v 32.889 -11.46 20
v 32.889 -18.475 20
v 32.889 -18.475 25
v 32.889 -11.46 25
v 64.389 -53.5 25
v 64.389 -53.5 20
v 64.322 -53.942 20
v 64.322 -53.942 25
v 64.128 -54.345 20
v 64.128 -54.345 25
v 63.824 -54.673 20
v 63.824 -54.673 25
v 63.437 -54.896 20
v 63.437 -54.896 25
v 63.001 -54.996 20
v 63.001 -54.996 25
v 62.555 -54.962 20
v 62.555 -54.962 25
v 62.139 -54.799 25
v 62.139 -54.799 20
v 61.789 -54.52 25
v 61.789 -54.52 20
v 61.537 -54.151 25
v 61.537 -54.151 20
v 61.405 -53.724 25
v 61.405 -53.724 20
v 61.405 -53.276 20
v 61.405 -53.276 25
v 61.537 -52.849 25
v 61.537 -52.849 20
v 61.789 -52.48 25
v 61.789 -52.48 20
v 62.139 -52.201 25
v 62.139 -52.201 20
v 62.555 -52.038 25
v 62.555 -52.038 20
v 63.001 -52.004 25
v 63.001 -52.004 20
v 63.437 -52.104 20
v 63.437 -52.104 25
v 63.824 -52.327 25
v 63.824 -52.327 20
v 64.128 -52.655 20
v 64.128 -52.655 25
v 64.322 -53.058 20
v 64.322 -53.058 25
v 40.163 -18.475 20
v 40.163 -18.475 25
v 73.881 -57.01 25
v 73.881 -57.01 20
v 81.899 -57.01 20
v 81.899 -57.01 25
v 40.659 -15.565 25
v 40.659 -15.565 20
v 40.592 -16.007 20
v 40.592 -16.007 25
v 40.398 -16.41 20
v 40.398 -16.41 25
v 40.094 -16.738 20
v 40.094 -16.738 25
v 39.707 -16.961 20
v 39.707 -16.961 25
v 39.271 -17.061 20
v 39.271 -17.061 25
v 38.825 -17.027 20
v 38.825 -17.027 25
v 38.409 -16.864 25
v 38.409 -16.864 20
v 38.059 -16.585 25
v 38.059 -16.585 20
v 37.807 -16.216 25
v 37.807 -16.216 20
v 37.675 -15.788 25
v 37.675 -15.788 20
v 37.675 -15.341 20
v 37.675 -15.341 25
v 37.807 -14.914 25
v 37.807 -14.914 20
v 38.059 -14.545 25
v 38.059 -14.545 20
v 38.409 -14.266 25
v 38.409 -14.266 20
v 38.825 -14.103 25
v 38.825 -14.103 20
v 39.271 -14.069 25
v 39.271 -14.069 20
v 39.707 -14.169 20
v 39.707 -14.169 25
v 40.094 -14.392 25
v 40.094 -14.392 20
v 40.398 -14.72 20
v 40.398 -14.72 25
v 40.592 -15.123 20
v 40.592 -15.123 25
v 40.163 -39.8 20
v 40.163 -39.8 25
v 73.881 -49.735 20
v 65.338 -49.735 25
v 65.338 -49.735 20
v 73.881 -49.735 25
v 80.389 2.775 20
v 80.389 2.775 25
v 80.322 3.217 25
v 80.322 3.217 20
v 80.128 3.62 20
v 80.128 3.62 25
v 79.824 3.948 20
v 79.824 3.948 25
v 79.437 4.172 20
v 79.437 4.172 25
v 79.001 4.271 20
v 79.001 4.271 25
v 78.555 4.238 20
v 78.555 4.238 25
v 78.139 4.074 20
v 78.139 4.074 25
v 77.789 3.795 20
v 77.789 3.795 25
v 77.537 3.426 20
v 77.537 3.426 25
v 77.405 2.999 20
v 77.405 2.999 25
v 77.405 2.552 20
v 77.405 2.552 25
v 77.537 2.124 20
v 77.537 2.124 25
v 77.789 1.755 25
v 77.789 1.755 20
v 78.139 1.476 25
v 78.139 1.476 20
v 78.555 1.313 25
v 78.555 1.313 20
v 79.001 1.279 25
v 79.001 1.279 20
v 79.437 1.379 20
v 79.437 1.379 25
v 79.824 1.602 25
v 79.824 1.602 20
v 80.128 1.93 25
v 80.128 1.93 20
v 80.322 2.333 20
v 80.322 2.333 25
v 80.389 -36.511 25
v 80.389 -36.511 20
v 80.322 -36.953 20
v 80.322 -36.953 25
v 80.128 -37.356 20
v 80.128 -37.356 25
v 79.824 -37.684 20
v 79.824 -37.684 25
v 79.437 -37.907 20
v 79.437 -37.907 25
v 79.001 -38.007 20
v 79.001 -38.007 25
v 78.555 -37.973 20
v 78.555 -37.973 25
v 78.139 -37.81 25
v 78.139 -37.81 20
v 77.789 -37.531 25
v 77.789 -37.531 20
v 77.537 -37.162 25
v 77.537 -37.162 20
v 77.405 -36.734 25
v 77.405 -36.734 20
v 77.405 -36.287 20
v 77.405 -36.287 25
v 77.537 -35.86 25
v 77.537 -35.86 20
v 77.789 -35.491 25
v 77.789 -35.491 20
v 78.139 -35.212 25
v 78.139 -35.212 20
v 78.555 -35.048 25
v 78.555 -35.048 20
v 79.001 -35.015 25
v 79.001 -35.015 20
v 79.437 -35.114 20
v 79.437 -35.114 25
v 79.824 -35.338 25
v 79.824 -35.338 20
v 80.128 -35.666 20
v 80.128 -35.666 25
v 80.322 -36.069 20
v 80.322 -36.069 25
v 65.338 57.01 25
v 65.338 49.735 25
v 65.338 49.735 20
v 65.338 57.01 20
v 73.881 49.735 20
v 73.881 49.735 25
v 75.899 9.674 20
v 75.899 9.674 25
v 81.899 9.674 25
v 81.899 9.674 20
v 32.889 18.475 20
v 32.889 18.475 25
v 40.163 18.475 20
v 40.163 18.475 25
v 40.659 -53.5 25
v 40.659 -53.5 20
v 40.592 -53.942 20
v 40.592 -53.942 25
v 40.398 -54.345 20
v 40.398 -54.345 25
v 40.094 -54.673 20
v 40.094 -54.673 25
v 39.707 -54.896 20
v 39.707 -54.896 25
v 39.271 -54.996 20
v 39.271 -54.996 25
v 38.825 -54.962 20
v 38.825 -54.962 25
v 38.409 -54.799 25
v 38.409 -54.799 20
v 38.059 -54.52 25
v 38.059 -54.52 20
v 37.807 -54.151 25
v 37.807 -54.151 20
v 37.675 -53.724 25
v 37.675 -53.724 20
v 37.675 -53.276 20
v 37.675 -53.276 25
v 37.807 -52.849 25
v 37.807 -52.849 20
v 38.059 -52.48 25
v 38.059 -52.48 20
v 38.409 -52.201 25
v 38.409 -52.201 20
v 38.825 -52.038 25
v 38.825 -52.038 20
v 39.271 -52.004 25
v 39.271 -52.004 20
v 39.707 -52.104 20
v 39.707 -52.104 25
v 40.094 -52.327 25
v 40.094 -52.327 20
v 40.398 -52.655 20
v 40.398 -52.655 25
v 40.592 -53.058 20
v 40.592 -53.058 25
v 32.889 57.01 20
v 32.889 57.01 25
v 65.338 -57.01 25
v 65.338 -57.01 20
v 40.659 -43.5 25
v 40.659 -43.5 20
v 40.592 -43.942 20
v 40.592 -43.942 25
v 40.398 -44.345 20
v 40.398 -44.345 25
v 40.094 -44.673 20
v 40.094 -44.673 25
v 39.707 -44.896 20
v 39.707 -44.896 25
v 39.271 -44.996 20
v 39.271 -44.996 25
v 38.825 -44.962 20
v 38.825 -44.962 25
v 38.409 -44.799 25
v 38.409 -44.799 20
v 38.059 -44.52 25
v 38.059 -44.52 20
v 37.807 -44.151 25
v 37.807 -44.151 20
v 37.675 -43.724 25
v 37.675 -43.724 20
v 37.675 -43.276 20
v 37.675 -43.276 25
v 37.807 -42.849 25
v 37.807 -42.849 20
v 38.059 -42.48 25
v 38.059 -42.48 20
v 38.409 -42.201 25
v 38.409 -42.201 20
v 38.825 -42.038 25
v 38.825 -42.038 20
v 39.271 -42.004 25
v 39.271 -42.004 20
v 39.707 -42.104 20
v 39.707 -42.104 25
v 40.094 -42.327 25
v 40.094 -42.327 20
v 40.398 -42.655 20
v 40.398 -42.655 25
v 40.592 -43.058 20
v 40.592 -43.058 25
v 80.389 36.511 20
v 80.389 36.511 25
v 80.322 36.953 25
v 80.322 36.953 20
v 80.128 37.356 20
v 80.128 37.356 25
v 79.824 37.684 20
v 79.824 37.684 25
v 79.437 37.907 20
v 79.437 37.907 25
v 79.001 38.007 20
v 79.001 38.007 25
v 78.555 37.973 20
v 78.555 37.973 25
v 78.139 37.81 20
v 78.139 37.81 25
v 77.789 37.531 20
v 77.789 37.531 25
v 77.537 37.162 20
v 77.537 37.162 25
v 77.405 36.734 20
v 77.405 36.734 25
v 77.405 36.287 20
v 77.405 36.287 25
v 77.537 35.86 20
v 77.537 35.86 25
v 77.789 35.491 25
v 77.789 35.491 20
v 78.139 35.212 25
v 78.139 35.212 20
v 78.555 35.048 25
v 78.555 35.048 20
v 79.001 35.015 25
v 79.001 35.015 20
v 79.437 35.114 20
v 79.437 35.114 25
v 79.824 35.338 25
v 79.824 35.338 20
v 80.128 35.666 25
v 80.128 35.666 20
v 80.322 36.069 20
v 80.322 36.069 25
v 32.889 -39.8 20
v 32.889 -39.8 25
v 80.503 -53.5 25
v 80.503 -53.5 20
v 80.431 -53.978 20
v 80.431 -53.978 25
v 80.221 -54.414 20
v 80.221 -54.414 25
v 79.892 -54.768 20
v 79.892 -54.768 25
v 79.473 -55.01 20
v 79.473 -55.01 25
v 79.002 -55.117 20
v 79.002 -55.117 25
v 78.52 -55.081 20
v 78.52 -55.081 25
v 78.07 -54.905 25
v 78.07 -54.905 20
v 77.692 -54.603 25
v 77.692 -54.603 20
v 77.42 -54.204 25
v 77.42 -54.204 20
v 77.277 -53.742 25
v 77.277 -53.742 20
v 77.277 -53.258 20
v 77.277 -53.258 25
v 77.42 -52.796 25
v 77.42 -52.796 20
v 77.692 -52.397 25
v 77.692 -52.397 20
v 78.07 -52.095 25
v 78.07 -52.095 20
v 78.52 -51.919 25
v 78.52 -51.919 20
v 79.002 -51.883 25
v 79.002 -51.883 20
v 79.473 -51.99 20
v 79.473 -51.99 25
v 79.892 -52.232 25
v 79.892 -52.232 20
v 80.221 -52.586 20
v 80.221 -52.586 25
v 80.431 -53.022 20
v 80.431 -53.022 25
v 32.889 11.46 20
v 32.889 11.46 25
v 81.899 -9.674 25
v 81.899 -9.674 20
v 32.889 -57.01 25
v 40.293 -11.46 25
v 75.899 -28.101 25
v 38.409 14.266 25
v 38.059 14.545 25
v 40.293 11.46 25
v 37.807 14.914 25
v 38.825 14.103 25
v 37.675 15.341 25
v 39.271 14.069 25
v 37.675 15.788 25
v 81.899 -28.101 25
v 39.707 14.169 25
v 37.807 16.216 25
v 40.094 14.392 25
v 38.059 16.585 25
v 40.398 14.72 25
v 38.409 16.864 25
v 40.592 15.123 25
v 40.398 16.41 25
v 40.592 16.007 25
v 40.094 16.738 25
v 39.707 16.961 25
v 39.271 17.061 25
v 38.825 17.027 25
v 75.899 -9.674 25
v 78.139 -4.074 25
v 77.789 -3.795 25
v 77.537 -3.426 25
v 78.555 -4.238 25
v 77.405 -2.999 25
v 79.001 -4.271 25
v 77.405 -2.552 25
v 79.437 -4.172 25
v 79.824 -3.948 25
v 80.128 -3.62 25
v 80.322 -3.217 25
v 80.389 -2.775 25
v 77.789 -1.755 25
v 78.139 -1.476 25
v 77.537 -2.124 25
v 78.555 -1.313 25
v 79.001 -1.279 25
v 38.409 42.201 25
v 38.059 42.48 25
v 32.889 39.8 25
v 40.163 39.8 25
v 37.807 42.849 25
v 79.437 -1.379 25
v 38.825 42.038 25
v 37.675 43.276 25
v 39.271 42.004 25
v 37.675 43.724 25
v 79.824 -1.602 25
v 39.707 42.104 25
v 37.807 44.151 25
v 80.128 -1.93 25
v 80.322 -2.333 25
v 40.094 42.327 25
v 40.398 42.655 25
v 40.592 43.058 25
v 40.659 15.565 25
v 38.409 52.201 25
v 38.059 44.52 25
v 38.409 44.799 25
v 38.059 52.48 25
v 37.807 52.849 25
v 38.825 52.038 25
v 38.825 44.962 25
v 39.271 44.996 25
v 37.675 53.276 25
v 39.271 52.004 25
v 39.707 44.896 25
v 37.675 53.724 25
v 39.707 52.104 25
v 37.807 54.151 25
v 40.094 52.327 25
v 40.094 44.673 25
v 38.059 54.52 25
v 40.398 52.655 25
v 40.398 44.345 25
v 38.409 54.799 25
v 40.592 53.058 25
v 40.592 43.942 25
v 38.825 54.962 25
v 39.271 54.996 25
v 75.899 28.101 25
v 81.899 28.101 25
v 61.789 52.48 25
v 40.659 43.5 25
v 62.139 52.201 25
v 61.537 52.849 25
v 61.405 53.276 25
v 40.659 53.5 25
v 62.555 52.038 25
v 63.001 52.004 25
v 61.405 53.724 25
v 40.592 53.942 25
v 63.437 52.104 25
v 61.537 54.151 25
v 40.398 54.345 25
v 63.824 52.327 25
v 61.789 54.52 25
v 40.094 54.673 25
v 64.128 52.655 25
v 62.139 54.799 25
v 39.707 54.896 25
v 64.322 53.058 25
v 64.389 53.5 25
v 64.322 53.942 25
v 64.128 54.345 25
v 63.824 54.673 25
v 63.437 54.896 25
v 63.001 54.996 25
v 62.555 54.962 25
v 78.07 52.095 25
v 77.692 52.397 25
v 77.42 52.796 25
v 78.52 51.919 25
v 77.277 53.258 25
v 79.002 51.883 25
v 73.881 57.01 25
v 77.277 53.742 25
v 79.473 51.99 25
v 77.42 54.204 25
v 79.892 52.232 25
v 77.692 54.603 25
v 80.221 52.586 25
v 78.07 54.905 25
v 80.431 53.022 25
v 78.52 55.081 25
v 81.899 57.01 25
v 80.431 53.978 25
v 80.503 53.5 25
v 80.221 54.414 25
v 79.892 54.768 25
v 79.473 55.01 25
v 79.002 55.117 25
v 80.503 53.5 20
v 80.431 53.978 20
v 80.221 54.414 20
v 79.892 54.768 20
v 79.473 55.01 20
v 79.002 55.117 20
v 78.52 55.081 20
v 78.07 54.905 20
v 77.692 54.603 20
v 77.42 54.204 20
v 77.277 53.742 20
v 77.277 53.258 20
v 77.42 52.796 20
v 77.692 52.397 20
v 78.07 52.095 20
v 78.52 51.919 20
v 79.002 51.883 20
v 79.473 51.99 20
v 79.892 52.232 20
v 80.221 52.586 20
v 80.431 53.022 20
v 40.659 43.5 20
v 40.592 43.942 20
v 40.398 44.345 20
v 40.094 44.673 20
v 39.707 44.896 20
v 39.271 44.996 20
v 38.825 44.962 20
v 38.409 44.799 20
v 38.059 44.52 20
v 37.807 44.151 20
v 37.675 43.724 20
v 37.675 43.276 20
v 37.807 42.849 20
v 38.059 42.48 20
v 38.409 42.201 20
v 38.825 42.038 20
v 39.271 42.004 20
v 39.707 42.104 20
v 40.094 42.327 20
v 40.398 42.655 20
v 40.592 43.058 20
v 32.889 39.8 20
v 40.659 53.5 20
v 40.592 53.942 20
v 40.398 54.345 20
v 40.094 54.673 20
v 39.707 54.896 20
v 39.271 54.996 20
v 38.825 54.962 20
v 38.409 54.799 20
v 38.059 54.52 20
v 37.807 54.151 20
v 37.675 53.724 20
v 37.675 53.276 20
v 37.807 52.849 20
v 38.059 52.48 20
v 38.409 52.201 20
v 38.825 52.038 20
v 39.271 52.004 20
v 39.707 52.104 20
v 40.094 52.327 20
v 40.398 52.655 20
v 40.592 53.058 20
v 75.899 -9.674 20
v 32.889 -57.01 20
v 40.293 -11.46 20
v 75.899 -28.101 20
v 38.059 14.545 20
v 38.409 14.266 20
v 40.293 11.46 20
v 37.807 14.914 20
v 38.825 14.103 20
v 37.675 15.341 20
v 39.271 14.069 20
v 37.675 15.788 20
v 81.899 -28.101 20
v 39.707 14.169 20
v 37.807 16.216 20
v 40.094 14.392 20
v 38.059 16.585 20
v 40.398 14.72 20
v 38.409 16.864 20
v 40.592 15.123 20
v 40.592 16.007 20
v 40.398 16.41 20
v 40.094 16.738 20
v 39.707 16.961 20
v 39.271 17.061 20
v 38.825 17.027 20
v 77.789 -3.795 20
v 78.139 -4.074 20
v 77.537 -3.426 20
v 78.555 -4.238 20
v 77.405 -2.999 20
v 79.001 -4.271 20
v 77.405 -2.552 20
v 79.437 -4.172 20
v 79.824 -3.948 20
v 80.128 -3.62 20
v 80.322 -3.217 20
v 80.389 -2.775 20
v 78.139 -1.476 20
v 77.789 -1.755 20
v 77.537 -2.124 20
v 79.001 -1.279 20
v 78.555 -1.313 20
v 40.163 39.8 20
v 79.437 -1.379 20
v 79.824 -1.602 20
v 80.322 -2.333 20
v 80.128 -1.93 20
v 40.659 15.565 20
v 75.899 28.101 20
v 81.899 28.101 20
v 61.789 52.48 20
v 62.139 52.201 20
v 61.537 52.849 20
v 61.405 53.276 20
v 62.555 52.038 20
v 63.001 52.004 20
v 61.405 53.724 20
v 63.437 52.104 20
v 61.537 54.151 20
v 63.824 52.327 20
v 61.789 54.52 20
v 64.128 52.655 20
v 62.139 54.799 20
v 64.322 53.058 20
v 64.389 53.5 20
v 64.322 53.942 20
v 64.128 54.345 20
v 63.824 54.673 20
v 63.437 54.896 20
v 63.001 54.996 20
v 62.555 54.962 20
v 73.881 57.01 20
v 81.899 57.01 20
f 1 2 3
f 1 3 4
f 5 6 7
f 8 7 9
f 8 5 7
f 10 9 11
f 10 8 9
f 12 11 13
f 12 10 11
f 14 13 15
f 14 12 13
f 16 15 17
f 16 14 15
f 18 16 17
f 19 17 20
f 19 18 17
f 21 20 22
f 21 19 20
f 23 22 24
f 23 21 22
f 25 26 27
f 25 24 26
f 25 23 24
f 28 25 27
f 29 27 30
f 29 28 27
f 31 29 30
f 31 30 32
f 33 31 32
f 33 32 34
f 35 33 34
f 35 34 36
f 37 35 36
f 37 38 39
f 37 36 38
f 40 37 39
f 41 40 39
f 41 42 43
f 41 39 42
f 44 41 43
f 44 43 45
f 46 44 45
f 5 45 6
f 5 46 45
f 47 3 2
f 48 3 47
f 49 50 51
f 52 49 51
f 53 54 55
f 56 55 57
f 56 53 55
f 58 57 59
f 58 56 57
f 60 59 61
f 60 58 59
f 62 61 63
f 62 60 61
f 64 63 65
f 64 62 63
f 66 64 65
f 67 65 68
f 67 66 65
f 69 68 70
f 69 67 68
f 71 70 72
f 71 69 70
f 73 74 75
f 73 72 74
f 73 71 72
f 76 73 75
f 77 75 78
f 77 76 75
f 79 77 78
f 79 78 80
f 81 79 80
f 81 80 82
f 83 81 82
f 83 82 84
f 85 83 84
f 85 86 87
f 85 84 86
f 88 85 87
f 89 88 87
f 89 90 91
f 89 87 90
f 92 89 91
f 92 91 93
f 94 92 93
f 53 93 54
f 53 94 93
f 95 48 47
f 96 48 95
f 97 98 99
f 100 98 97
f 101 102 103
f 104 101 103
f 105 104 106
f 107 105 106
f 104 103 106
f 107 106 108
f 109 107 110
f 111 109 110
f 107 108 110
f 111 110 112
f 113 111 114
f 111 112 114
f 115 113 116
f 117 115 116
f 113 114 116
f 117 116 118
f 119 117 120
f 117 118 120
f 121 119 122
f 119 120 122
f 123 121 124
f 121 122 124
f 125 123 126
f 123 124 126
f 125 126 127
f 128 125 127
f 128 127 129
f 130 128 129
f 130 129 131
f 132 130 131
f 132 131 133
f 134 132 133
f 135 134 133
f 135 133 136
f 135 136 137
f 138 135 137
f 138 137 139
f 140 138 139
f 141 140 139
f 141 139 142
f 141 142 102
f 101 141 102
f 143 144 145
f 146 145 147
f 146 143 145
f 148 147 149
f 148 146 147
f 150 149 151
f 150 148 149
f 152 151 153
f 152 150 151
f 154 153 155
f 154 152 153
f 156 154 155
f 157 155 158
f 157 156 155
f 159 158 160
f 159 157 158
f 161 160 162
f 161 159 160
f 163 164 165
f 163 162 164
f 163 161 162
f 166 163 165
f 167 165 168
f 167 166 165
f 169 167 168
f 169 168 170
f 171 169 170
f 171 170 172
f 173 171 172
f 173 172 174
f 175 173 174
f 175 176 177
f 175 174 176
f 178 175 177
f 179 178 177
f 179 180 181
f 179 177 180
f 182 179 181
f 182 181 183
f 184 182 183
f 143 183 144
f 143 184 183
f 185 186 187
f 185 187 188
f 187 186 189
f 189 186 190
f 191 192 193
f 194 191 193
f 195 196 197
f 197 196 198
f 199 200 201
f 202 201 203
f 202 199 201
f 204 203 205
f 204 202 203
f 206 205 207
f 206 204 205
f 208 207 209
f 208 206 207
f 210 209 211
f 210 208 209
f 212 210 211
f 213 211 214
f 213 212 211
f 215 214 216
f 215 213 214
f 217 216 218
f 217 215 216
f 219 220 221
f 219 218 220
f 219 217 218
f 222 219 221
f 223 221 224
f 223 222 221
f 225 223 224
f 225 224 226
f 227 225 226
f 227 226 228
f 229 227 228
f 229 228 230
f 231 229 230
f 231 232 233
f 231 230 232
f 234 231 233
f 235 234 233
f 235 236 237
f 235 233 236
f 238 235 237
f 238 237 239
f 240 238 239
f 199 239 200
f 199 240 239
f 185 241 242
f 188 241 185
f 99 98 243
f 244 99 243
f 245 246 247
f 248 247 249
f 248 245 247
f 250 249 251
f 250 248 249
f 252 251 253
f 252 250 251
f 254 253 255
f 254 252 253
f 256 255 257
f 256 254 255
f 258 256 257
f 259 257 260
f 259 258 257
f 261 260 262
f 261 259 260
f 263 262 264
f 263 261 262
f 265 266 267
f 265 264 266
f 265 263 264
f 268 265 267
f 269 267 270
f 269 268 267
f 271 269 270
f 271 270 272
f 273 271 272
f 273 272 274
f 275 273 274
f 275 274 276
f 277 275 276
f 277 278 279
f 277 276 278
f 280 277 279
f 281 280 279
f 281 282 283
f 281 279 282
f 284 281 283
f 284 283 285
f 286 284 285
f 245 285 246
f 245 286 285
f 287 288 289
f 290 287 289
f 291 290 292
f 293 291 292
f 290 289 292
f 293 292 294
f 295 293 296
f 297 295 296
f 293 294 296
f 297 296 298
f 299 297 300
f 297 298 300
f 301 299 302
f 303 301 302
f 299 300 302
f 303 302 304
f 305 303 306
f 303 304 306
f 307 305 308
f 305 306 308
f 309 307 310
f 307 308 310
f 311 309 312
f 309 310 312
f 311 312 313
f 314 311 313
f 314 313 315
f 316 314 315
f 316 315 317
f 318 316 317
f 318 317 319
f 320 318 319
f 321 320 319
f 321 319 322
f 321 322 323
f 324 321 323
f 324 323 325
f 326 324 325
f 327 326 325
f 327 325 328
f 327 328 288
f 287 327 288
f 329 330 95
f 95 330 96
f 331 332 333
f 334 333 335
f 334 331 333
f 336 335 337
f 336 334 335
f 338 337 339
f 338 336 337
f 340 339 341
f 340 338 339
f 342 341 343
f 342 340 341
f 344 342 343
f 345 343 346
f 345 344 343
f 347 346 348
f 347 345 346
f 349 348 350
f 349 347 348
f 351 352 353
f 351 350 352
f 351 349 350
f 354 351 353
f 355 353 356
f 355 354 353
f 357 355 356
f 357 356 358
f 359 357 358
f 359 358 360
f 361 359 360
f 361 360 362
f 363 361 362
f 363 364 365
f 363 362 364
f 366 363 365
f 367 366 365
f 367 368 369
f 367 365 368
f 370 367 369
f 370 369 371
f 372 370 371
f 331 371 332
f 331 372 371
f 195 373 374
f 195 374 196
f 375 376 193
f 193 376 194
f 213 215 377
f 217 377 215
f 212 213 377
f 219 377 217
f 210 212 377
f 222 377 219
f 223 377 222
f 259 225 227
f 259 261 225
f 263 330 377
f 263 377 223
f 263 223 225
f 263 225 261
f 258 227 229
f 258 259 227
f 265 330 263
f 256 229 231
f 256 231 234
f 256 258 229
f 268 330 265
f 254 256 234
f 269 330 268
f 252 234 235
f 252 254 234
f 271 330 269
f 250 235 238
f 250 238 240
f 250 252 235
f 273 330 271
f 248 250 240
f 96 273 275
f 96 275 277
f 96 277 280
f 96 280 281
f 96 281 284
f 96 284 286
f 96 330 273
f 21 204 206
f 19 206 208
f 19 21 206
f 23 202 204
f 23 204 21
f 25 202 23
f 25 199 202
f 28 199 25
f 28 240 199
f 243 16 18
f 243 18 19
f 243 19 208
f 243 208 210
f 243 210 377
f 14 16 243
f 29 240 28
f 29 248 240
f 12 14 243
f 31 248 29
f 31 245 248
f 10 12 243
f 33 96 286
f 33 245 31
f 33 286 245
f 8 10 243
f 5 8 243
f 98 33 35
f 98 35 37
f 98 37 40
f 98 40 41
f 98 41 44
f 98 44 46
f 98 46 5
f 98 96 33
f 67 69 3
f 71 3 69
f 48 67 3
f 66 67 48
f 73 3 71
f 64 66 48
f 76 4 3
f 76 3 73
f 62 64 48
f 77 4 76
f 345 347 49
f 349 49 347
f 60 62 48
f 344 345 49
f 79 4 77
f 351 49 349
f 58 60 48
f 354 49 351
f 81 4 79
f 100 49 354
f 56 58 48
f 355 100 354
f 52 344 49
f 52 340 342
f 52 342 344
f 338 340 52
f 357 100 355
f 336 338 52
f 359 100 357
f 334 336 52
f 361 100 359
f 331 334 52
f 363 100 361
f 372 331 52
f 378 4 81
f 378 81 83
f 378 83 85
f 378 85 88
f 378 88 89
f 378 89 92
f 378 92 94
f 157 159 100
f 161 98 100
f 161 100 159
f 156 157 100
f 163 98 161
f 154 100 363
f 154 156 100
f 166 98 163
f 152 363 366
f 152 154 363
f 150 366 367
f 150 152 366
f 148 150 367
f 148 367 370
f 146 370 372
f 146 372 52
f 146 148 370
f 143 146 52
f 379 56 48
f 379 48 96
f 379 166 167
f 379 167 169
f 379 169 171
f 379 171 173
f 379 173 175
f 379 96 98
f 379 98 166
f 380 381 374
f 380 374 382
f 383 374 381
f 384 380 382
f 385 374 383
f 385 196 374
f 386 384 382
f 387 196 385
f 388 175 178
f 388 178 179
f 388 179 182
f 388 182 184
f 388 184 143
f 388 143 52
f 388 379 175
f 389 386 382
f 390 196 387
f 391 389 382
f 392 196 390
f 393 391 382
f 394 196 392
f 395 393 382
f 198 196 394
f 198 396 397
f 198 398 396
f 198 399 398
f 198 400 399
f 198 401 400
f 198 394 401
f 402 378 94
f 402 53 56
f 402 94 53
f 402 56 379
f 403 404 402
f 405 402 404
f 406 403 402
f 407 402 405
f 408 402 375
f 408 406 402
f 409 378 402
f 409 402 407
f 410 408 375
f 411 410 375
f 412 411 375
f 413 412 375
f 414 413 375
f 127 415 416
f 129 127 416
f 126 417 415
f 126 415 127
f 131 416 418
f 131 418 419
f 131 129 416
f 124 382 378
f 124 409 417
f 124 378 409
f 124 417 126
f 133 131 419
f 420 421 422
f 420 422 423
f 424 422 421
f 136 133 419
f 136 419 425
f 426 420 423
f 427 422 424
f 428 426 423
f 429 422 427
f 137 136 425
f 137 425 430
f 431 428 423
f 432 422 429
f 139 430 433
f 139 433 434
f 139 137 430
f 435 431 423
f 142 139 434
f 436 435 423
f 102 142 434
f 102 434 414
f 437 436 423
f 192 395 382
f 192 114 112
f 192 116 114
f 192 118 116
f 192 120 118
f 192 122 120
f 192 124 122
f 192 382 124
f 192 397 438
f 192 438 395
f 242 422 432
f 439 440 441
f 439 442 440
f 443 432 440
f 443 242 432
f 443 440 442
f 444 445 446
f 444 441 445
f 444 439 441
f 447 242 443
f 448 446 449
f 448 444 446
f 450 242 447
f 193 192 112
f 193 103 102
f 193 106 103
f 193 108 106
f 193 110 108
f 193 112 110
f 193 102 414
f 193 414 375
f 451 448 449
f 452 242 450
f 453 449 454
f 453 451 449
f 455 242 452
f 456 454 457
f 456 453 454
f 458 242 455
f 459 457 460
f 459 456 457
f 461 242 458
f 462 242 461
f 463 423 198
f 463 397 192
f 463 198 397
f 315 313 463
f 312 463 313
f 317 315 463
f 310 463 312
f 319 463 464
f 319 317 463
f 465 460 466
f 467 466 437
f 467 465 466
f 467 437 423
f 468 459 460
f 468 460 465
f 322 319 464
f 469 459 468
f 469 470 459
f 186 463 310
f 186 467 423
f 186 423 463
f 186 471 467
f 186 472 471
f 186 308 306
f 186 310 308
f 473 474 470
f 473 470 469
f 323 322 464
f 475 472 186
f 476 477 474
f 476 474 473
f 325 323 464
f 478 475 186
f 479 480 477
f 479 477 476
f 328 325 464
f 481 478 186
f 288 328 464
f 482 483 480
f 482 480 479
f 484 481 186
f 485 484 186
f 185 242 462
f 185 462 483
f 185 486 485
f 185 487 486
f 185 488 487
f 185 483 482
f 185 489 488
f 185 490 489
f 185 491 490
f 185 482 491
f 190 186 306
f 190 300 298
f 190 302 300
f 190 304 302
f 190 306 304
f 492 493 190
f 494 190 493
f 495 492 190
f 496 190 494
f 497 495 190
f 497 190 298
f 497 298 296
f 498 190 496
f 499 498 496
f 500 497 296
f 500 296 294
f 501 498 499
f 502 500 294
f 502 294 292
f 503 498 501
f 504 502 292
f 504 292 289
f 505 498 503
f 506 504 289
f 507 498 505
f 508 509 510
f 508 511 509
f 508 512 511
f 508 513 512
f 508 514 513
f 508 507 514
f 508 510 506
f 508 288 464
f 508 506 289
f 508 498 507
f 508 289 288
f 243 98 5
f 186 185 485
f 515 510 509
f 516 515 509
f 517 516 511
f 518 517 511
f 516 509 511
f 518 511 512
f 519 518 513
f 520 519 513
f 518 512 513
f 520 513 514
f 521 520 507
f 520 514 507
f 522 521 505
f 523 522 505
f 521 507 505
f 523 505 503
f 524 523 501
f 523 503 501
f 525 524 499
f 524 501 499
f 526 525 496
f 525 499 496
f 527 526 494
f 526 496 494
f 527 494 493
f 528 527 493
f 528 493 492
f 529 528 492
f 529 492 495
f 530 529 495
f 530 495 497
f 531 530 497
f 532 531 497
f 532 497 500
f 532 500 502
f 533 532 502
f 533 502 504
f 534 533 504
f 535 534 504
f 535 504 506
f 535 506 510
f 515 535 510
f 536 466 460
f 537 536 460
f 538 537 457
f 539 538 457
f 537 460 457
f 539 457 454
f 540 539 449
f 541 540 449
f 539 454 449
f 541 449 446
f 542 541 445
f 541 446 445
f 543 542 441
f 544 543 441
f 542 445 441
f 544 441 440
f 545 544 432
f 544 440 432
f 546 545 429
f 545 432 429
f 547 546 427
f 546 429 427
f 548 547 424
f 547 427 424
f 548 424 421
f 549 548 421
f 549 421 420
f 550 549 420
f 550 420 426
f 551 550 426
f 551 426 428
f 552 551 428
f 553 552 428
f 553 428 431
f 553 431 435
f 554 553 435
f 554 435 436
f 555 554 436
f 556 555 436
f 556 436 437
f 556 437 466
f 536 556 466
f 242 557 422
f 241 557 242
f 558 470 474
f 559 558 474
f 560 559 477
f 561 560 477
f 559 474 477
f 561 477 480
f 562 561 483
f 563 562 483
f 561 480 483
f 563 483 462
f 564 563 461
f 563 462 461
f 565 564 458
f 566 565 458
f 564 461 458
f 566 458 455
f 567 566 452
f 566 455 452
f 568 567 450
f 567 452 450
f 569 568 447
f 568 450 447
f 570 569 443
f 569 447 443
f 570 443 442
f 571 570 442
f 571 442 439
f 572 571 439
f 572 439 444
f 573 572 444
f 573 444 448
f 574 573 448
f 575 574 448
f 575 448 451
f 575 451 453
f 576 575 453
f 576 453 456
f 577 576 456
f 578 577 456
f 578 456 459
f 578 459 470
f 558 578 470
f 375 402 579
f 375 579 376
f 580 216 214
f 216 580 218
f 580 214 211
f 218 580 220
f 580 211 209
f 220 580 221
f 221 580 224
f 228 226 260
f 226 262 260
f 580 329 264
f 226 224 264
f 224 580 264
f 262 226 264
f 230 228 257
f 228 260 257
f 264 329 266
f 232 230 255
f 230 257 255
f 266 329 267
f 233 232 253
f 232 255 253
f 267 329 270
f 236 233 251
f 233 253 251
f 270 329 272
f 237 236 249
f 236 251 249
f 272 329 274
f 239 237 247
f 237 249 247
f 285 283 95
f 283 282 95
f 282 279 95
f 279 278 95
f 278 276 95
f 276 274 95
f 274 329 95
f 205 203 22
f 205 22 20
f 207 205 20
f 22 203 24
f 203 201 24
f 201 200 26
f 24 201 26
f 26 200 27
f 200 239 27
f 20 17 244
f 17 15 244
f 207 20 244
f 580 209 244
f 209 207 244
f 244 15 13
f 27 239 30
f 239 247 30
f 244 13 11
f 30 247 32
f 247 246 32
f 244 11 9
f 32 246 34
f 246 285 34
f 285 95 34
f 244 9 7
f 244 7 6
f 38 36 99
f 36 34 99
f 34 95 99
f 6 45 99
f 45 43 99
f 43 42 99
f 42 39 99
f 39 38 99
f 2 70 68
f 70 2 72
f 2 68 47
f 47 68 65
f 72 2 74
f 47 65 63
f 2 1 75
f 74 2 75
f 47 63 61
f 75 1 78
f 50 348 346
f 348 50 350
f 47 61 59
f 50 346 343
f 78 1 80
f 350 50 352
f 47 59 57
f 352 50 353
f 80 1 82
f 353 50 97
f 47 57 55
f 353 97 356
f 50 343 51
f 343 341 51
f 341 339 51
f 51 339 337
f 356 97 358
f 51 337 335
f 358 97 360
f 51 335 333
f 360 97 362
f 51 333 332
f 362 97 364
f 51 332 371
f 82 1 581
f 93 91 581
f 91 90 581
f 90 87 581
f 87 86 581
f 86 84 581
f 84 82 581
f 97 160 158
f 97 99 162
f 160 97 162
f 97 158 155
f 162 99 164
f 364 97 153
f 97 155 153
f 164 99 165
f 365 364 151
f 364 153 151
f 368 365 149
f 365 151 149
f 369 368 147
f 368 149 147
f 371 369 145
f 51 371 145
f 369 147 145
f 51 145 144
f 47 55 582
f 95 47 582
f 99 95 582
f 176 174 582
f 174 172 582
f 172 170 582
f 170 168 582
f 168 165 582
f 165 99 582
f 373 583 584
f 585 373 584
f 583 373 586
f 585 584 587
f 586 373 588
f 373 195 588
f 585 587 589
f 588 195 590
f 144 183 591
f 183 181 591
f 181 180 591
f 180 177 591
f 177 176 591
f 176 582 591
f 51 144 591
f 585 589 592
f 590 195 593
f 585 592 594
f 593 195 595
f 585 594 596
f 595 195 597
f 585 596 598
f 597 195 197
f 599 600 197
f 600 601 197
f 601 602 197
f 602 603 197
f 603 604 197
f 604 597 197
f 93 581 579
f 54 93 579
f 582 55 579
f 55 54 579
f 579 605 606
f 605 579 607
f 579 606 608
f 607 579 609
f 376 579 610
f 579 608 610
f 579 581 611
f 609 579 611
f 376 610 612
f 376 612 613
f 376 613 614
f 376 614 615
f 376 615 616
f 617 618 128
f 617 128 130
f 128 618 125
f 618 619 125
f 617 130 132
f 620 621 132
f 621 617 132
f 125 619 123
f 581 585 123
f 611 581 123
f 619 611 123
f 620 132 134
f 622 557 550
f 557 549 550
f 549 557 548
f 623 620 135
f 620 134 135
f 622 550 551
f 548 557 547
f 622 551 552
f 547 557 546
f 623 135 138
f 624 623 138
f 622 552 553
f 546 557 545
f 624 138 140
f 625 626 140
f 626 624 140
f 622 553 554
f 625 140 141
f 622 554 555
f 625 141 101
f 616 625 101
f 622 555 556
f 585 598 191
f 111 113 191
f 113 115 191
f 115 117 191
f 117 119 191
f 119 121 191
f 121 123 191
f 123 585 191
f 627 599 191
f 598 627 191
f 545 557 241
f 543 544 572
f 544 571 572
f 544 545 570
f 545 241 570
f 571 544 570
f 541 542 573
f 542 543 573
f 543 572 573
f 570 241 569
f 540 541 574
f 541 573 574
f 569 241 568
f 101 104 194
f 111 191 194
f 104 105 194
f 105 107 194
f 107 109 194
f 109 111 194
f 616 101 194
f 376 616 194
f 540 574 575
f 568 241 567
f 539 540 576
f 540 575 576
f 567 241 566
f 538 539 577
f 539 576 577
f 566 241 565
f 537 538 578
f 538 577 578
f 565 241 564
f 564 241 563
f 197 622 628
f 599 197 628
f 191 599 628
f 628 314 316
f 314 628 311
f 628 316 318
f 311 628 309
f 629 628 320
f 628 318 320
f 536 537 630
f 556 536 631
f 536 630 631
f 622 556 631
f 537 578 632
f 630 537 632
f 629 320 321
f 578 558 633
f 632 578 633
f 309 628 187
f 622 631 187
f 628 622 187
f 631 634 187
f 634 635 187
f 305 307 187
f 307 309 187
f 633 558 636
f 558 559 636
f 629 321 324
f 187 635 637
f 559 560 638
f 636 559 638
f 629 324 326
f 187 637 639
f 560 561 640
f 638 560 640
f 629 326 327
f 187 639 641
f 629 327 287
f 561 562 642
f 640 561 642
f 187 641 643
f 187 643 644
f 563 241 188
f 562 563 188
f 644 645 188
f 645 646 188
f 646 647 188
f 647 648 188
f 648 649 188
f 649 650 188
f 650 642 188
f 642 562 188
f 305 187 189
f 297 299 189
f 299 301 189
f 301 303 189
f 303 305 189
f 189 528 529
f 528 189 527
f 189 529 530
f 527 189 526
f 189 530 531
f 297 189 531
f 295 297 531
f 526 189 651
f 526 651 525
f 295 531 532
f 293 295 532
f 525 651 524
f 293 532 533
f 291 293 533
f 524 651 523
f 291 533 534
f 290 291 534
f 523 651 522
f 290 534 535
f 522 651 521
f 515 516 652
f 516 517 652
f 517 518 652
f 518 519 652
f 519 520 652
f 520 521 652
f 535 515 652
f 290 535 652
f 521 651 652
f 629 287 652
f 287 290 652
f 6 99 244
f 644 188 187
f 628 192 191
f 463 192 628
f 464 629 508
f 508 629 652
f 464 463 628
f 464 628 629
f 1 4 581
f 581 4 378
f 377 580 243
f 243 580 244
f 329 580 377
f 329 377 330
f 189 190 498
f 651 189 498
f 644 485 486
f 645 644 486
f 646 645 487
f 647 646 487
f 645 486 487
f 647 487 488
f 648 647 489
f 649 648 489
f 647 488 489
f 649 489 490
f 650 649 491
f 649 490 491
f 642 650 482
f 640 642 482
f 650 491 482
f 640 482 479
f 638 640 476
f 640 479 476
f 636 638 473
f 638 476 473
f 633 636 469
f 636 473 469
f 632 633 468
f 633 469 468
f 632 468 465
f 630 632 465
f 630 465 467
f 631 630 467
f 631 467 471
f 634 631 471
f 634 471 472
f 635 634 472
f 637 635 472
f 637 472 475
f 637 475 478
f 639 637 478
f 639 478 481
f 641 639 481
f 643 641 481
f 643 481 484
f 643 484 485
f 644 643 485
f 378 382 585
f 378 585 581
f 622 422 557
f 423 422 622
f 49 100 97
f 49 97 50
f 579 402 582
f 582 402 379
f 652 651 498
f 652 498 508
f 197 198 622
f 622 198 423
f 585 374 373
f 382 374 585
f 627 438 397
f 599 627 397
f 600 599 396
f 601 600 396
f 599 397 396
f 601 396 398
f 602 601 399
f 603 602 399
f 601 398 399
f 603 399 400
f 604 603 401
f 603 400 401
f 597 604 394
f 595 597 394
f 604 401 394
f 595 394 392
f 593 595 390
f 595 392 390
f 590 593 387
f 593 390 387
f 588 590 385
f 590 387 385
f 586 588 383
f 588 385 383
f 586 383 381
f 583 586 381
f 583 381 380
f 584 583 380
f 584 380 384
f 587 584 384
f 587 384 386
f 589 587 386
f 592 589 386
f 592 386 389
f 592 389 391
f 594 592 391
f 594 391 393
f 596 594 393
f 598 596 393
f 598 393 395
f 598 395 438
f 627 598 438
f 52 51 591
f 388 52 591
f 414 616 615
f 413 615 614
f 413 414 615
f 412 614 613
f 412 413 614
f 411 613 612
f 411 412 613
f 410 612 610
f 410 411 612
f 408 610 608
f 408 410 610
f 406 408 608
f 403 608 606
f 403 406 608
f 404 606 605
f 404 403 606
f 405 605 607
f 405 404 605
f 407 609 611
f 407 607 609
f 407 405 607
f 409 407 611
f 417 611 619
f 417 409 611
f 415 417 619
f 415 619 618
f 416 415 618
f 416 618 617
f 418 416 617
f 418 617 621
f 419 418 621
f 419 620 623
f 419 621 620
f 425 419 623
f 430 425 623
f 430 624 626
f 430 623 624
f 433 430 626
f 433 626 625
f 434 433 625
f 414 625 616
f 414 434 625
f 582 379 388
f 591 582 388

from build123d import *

# Parameters (mm, degrees)
EXTRUDE_1_DEPTH     = 10
SKETCH_2_R          = 1.5
CUT_EXTRUDE_1_DEPTH = 10
SKETCH_3_R          = 1.5
CUT_EXTRUDE_2_DEPTH = 10
SKETCH_5_W          = 49.01
SKETCH_5_H          = 114.02
EXTRUDE_2_DEPTH     = 5
SKETCH_7_W          = 7.579952265
SKETCH_7_H          = 21.325107759
SKETCH_7_H_2        = 11.778124307
SKETCH_7_W_2        = 8.542902392
SKETCH_7_H_3        = 7.419730403
CUT_EXTRUDE_3_DEPTH = 10
SKETCH_8_W          = 6
SKETCH_8_H          = 18.426440066
CUT_EXTRUDE_4_DEPTH = 10
SKETCH_9_R          = 1.5
SKETCH_9_R_2        = 1.621792445
CUT_EXTRUDE_5_DEPTH = 10


with BuildPart() as part:
    # 草图1 → 凸台-拉伸1 (new body)
    with BuildSketch(Plane.XY):
        with BuildLine():
            Line((118, 210), (-118, 210))
            Line((-118, 210), (-118, -210))
            Line((-118, -210), (118, -210))
            Line((118, -210), (118, -50.5))
            Line((118, -50.5), (54.15, -50.5))
            Line((54.15, -50.5), (54.15, -9.334147293))
            ThreePointArc((54.15, -9.334147293), (42.020728949, 0), (54.15, 9.334147293))
            Line((54.15, 9.334147293), (54.15, 50.5))
            Line((54.15, 50.5), (118, 50.5))
            Line((118, 50.5), (118, 210))
        make_face()
    extrude(amount=EXTRUDE_1_DEPTH)

    # 草图2 → 切除-拉伸1 (cut)
    with BuildSketch(Plane.XY.offset(10)):
        with Locations((-88, 135)):
            Circle(SKETCH_2_R)
        with Locations((-43, 180)):
            Circle(SKETCH_2_R)
        with Locations((-88, 180)):
            Circle(SKETCH_2_R)
    extrude(amount=-CUT_EXTRUDE_1_DEPTH, mode=Mode.SUBTRACT)

    # 草图3 → 切除-拉伸2 (cut)
    with BuildSketch(Plane.XY.offset(10)):
        with Locations((51.15, -15.672792958)):
            Circle(SKETCH_3_R)
        with Locations((112.73, -53.5)):
            Circle(SKETCH_3_R)
        with Locations((112.73, -59.5)):
            Circle(SKETCH_3_R)
        with Locations((87.23, -53.5)):
            Circle(SKETCH_3_R)
        with Locations((87.23, -59.5)):
            Circle(SKETCH_3_R)
        with Locations((77.23, -53.5)):
            Circle(SKETCH_3_R)
        with Locations((61.23, -53.5)):
            Circle(SKETCH_3_R)
        with Locations((51.15, -53.5)):
            Circle(SKETCH_3_R)
        with Locations((51.15, -43.5)):
            Circle(SKETCH_3_R)
    cut_extrude_2 = extrude(amount=-CUT_EXTRUDE_2_DEPTH, mode=Mode.SUBTRACT)

    # 镜向1: 切除-拉伸2 across plane
    add(cut_extrude_2.mirror(Plane.ZX), mode=Mode.SUBTRACT)


with BuildPart() as body_2:
    # 草图5 → 凸台-拉伸2 (new body)
    with BuildSketch(Plane.XY.offset(20)):
        with Locations((57.393575669, 0)):
            Rectangle(SKETCH_5_W, SKETCH_5_H)
    extrude(amount=EXTRUDE_2_DEPTH)

    # 草图7 → 切除-拉伸3 (cut)
    with BuildSketch(Plane.XY.offset(25)):
        with Locations((36.372677837, 29.137446121)):
            Rectangle(SKETCH_7_W, SKETCH_7_H)
        with Locations((36.502822244, 5.570937847)):
            Rectangle(SKETCH_7_W, SKETCH_7_H_2)
        with Locations((69.609392324, 53.445086976)):
            Rectangle(SKETCH_7_W_2, SKETCH_7_H_3)
    cut_extrude_3 = extrude(amount=-CUT_EXTRUDE_3_DEPTH, mode=Mode.SUBTRACT)

    # 镜向2: 切除-拉伸3 across plane
    add(cut_extrude_3.mirror(Plane.ZX), mode=Mode.SUBTRACT)

    # 草图8 → 切除-拉伸4 (cut)
    with BuildSketch(Plane.XY.offset(25)):
        with Locations((78.898575669, 18.887565602)):
            Rectangle(SKETCH_8_W, SKETCH_8_H)
    cut_extrude_4 = extrude(amount=-CUT_EXTRUDE_4_DEPTH, mode=Mode.SUBTRACT)

    # 镜向3: 切除-拉伸4 across plane
    add(cut_extrude_4.mirror(Plane.ZX), mode=Mode.SUBTRACT)

    # 草图9 → 切除-拉伸5 (cut)
    with BuildSketch(Plane.XY.offset(25)):
        with Locations((39.158575669, 53.5)):
            Circle(SKETCH_9_R)
        with Locations((62.888575669, 53.5)):
            Circle(SKETCH_9_R)
        with Locations((39.158575669, 43.5)):
            Circle(SKETCH_9_R)
        with Locations((78.88084352, 53.5)):
            Circle(SKETCH_9_R_2)
        with Locations((39.158575669, 15.564892241)):
            Circle(SKETCH_9_R)
        with Locations((78.888575669, 36.510785635)):
            Circle(SKETCH_9_R)
        with Locations((78.888575669, 2.775221774)):
            Circle(SKETCH_9_R)
    cut_extrude_5 = extrude(amount=-CUT_EXTRUDE_5_DEPTH, mode=Mode.SUBTRACT)

    # 镜向5: 切除-拉伸5 across plane
    add(cut_extrude_5.mirror(Plane.ZX), mode=Mode.SUBTRACT)


solid = body_2.part
